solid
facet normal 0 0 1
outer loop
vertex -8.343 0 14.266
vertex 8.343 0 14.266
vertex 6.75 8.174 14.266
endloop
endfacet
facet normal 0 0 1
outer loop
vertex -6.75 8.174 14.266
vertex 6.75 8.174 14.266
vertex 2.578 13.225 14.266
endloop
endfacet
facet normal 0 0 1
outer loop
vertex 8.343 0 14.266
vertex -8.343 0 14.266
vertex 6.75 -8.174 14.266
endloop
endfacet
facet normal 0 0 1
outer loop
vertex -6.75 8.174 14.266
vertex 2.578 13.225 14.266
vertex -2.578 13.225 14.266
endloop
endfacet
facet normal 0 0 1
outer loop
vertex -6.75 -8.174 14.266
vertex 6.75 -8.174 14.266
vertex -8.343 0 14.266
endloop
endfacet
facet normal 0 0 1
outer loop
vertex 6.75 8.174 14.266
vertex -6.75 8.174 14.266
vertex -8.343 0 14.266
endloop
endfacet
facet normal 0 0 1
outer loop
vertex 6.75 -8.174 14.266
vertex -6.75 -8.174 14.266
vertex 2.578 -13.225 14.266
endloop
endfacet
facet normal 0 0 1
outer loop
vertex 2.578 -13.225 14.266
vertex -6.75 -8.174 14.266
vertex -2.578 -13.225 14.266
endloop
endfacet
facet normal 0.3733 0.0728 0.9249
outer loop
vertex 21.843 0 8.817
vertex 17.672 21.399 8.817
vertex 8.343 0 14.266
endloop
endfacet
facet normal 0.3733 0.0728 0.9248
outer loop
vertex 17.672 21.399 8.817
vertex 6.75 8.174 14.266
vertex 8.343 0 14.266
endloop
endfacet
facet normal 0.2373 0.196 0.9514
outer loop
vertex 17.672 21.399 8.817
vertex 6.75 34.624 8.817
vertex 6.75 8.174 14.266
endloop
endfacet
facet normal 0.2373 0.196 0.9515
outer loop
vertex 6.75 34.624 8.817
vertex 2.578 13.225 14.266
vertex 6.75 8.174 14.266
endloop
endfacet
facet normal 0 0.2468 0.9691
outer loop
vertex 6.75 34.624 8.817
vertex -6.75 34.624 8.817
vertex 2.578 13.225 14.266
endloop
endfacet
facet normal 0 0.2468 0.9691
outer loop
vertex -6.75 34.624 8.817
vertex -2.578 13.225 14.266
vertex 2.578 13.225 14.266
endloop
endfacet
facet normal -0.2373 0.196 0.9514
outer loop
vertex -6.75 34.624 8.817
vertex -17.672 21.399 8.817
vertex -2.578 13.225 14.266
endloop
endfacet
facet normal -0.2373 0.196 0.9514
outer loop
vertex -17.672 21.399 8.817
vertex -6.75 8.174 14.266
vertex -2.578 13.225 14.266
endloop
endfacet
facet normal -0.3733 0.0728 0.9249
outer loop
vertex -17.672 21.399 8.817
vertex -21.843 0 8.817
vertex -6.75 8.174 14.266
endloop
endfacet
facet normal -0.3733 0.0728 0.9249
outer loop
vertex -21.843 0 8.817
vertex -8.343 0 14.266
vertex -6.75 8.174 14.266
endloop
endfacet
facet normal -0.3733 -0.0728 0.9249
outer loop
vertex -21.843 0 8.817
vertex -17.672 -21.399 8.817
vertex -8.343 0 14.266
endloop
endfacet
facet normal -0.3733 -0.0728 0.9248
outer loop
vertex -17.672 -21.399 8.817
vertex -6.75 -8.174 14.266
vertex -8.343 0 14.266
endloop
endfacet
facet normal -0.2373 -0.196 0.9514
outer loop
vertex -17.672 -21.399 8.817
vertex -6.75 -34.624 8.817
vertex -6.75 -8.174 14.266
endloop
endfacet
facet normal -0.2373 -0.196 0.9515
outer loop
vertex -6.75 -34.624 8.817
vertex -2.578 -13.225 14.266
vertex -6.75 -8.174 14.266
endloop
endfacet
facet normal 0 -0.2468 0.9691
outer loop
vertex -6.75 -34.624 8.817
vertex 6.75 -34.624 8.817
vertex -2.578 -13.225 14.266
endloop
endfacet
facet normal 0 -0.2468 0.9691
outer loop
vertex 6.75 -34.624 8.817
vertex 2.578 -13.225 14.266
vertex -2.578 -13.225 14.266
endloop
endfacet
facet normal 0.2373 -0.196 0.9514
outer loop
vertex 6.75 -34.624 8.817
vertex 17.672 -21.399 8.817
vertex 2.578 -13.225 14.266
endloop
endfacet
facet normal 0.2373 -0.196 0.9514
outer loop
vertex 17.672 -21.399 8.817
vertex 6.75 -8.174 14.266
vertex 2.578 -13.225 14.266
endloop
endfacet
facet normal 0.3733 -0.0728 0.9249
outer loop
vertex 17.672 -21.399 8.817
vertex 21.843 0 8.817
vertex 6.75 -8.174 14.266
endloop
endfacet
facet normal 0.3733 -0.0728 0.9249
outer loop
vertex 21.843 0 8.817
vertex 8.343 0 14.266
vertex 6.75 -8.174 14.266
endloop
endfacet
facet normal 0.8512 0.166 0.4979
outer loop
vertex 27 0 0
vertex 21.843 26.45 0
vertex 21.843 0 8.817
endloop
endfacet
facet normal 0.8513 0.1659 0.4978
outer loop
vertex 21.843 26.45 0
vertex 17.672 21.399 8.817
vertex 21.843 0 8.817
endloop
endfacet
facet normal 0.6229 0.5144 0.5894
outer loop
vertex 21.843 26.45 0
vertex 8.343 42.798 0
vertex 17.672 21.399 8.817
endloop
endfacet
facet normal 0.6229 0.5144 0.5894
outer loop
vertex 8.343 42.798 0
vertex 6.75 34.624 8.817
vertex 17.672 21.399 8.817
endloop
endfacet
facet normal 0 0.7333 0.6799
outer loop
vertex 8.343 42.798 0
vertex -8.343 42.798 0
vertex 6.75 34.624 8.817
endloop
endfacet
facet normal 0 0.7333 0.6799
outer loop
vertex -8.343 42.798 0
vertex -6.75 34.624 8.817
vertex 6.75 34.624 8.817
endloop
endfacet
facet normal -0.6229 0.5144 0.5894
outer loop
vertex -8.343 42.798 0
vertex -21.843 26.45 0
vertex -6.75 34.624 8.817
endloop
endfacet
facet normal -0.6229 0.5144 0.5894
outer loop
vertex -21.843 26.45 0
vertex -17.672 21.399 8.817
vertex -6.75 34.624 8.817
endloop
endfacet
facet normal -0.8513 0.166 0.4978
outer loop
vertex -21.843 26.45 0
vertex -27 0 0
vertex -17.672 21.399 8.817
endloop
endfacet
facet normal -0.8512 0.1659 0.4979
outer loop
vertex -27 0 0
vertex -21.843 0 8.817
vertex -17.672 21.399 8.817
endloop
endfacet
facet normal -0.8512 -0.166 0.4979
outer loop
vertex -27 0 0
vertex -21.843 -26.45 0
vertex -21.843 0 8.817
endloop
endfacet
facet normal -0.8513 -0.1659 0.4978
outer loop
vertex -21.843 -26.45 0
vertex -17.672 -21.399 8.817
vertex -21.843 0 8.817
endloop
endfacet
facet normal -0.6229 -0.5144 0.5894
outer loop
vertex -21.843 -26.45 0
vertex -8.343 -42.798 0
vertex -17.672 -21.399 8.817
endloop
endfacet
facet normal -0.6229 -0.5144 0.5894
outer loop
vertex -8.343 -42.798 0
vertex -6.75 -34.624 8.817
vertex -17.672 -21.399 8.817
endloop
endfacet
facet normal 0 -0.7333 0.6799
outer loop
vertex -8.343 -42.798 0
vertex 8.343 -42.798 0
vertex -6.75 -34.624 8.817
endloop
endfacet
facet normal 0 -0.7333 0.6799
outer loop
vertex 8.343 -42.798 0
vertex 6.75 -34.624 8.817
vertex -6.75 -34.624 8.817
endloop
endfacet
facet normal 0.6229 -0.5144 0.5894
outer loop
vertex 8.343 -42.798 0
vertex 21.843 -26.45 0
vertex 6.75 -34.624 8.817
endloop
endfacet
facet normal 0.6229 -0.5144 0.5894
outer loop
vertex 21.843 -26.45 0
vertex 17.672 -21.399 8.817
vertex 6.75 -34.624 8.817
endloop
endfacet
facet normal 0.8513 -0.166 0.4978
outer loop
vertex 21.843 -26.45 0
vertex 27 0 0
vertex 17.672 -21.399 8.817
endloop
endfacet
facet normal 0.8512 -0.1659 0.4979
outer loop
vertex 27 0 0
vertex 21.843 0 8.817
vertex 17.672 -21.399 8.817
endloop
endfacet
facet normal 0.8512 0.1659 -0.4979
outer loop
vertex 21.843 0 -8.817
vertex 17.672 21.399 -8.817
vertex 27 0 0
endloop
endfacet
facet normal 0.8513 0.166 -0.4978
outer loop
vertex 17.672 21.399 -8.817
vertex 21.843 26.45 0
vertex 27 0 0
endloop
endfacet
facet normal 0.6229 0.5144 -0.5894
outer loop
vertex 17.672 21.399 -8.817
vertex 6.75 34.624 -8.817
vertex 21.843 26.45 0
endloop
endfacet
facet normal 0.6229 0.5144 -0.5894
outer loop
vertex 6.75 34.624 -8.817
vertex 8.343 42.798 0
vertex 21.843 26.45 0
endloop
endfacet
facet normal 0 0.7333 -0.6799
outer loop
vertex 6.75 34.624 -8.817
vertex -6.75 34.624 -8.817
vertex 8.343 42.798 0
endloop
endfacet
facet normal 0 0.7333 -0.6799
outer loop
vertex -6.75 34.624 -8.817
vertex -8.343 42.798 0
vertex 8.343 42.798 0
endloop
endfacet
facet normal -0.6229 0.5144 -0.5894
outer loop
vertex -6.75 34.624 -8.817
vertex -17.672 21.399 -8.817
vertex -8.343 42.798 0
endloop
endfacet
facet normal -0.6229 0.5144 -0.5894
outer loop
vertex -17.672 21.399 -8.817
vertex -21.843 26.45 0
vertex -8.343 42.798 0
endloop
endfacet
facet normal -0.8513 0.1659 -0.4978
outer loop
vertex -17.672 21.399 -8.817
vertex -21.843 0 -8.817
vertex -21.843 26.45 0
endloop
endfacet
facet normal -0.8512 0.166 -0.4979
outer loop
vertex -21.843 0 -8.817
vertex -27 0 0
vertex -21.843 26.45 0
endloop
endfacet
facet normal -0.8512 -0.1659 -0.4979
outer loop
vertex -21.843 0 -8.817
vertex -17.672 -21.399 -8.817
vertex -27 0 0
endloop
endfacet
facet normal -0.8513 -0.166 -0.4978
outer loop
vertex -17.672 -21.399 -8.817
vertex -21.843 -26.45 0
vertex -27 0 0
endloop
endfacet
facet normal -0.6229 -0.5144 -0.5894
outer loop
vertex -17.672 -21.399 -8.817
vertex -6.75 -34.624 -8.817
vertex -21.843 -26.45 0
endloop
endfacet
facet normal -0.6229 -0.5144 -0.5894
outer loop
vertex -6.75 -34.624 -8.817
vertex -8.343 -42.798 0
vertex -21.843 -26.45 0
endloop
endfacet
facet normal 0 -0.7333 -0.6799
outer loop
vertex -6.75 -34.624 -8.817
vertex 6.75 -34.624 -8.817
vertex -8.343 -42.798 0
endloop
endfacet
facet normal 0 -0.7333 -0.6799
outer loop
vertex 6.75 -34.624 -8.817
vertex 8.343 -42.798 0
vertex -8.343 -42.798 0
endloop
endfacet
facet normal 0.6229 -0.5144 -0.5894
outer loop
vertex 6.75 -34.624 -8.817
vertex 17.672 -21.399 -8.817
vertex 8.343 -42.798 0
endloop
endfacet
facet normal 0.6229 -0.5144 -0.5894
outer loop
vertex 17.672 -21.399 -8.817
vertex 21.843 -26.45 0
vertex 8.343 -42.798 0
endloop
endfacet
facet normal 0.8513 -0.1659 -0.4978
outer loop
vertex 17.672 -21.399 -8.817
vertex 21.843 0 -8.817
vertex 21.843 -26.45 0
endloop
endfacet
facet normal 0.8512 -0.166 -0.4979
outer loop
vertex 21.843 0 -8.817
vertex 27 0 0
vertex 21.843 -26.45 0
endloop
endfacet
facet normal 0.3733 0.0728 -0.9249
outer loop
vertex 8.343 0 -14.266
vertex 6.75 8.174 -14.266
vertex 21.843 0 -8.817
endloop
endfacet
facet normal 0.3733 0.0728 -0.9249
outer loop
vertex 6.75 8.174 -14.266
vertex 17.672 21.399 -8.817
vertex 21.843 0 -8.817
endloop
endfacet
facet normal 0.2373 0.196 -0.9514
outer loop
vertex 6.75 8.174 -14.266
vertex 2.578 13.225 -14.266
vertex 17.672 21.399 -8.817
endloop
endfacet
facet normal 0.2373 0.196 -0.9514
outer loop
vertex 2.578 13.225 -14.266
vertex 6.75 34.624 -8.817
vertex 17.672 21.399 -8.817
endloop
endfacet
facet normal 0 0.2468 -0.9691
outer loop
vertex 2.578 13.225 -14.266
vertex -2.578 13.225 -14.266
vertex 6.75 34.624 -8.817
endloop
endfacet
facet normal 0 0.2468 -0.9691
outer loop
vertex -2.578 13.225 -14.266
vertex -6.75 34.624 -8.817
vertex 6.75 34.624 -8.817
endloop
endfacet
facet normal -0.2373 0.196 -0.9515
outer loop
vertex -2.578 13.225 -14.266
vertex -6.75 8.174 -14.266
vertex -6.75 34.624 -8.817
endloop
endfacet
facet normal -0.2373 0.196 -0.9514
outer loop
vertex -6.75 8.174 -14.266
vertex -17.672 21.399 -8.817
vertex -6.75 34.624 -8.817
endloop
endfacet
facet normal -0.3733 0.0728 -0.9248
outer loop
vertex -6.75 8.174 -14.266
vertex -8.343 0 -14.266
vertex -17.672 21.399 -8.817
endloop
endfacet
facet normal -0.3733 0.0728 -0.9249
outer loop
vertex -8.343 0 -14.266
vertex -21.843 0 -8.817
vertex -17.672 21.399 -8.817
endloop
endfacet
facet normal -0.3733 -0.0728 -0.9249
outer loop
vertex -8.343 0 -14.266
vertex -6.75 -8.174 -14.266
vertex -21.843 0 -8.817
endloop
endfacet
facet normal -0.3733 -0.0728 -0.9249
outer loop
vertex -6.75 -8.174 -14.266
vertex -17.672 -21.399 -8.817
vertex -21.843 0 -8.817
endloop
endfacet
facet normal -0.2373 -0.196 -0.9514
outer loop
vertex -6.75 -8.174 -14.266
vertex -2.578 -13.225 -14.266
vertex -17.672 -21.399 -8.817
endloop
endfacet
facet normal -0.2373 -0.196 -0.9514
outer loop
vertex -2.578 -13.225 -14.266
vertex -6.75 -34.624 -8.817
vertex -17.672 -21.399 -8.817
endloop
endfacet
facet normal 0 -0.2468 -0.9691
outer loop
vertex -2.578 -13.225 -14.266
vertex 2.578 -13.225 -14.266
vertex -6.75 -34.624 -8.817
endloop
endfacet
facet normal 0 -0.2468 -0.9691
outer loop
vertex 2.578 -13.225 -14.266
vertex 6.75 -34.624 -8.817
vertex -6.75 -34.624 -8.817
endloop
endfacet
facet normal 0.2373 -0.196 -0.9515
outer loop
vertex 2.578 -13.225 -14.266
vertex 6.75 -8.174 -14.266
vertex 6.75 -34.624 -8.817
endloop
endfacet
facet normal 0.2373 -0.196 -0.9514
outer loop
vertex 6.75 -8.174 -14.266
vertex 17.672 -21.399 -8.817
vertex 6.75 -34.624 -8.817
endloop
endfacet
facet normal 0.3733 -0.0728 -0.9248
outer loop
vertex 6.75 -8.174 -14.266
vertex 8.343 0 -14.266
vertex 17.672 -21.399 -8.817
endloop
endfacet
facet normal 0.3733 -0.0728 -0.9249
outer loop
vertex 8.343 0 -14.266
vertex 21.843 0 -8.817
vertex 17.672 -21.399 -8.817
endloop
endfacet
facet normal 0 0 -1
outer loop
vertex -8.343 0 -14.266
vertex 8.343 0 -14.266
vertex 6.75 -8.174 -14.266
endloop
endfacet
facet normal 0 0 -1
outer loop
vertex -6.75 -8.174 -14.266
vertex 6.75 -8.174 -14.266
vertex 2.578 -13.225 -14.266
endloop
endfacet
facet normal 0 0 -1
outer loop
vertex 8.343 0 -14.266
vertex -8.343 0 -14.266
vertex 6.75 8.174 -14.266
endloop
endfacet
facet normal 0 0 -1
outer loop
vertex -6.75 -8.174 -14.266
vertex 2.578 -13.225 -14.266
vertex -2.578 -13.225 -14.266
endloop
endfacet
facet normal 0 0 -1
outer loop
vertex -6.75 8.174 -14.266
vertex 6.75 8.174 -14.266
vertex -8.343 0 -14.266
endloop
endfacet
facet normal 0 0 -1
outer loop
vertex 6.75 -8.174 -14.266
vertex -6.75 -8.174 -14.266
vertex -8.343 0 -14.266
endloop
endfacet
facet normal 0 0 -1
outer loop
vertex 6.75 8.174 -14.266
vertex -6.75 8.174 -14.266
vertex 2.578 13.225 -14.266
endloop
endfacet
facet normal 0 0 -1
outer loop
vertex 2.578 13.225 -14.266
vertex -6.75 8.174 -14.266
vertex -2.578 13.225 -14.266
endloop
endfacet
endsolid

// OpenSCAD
// Generated by SolidPython 1.0.1 on 2020-07-29 00:46:49


scale(v = [9, 15, 5]) {
	sphere(r = 3);
}
/***********************************************
*********      SolidPython code:      **********
************************************************
 
# import packages: SolidPython
from solid import *
from solid.utils import *
from itertools import chain, combinations, permutations


class Resize:

    def __init__(self, scad_file):
        self.scad_file = scad_file
        #self.scad_file = import_scad(scad_file)
        # cone/cylinder param:
        self.r1 = 0
        self.r2 = 0
        self.h = 0
        # rectangular prism param:
        self.w = 0
        self.l = 0
        # ellipse param:
        self.r = 0

    # import OpenScad code (file name corresponds to shape)


    # classify shape + parameters
    def assign(self, param1, param2, param3):
        if self.scad_file == 'cone.scad':
            self.r1 = param1
            self.r2 = param2
            self.h = param3
        elif self.scad_file == 'cylinder.scad':
            self.r1 = param1
            self.r2 = param2
            self.h = param3
        elif self.scad_file == 'rectangularPrism.scad':
            self.h = param1
            self.l = param2
            self.w = param3
        else:
            self.r = param1
            self.h = param2

    # resize parameters
    def iterate(self):
        x = range(3, 20, 2)
        i = 1
        if self.scad_file == 'cone.scad':
            tempList = list(permutations(x, 2))
            for temp in tempList:
                param1 = temp[0]
                param2 = temp[1]
                filepath = 'produced_scad_files/' + 'cone' + str(param1) + '_' + str(param2) + '_' + '.scad'
                scad_render_to_file(cylinder(h=param1, r1=param2, r2=0), filepath)

        elif self.scad_file == 'cylinder.scad':
            tempList = list(permutations(x, 3))
            for temp in tempList:
                param1 = temp[0]
                param2 = temp[1]
                filepath = 'produced_scad_files/' + 'cylinder' + str(param1) + '_' + str(param2) + '_' + '.scad'
                scad_render_to_file(cylinder(h=param1, r1=param2, r2=param2), filepath)

        elif self.scad_file == 'rectangularPrism.scad':
            tempList = list(permutations(x, 3))
            for temp in tempList:
                param1 = temp[0]
                param2 = temp[1]
                param3 = temp[2]
                filepath = 'produced_scad_files/' + 'rectangularPrism' + str(param1) + '_' + str(param2) + '_' + str(
                    param3) + '.scad'
                scad_render_to_file(cube(size=(param1, param2, param3)), filepath)

        elif self.scad_file == 'ellipse.scad':
            tempList = list(permutations(x, 4))
            for temp in tempList:
                param1 = temp[0]
                param2 = temp[1]
                param3 = temp[2]
                param4 = temp[3]
                filepath = 'produced_scad_files/' + 'ellipse' + str(param1) + '_' + str(param2) + '_' + str(param3) + '_' + str(param4) + '.scad'
                scad_render_to_file(scale([param1, param2, param3])(sphere(r=param4)), filepath)

    def render_to_scadfile(self):
        scad_render_to_file(scad, 'example.scad') 
 
************************************************/
